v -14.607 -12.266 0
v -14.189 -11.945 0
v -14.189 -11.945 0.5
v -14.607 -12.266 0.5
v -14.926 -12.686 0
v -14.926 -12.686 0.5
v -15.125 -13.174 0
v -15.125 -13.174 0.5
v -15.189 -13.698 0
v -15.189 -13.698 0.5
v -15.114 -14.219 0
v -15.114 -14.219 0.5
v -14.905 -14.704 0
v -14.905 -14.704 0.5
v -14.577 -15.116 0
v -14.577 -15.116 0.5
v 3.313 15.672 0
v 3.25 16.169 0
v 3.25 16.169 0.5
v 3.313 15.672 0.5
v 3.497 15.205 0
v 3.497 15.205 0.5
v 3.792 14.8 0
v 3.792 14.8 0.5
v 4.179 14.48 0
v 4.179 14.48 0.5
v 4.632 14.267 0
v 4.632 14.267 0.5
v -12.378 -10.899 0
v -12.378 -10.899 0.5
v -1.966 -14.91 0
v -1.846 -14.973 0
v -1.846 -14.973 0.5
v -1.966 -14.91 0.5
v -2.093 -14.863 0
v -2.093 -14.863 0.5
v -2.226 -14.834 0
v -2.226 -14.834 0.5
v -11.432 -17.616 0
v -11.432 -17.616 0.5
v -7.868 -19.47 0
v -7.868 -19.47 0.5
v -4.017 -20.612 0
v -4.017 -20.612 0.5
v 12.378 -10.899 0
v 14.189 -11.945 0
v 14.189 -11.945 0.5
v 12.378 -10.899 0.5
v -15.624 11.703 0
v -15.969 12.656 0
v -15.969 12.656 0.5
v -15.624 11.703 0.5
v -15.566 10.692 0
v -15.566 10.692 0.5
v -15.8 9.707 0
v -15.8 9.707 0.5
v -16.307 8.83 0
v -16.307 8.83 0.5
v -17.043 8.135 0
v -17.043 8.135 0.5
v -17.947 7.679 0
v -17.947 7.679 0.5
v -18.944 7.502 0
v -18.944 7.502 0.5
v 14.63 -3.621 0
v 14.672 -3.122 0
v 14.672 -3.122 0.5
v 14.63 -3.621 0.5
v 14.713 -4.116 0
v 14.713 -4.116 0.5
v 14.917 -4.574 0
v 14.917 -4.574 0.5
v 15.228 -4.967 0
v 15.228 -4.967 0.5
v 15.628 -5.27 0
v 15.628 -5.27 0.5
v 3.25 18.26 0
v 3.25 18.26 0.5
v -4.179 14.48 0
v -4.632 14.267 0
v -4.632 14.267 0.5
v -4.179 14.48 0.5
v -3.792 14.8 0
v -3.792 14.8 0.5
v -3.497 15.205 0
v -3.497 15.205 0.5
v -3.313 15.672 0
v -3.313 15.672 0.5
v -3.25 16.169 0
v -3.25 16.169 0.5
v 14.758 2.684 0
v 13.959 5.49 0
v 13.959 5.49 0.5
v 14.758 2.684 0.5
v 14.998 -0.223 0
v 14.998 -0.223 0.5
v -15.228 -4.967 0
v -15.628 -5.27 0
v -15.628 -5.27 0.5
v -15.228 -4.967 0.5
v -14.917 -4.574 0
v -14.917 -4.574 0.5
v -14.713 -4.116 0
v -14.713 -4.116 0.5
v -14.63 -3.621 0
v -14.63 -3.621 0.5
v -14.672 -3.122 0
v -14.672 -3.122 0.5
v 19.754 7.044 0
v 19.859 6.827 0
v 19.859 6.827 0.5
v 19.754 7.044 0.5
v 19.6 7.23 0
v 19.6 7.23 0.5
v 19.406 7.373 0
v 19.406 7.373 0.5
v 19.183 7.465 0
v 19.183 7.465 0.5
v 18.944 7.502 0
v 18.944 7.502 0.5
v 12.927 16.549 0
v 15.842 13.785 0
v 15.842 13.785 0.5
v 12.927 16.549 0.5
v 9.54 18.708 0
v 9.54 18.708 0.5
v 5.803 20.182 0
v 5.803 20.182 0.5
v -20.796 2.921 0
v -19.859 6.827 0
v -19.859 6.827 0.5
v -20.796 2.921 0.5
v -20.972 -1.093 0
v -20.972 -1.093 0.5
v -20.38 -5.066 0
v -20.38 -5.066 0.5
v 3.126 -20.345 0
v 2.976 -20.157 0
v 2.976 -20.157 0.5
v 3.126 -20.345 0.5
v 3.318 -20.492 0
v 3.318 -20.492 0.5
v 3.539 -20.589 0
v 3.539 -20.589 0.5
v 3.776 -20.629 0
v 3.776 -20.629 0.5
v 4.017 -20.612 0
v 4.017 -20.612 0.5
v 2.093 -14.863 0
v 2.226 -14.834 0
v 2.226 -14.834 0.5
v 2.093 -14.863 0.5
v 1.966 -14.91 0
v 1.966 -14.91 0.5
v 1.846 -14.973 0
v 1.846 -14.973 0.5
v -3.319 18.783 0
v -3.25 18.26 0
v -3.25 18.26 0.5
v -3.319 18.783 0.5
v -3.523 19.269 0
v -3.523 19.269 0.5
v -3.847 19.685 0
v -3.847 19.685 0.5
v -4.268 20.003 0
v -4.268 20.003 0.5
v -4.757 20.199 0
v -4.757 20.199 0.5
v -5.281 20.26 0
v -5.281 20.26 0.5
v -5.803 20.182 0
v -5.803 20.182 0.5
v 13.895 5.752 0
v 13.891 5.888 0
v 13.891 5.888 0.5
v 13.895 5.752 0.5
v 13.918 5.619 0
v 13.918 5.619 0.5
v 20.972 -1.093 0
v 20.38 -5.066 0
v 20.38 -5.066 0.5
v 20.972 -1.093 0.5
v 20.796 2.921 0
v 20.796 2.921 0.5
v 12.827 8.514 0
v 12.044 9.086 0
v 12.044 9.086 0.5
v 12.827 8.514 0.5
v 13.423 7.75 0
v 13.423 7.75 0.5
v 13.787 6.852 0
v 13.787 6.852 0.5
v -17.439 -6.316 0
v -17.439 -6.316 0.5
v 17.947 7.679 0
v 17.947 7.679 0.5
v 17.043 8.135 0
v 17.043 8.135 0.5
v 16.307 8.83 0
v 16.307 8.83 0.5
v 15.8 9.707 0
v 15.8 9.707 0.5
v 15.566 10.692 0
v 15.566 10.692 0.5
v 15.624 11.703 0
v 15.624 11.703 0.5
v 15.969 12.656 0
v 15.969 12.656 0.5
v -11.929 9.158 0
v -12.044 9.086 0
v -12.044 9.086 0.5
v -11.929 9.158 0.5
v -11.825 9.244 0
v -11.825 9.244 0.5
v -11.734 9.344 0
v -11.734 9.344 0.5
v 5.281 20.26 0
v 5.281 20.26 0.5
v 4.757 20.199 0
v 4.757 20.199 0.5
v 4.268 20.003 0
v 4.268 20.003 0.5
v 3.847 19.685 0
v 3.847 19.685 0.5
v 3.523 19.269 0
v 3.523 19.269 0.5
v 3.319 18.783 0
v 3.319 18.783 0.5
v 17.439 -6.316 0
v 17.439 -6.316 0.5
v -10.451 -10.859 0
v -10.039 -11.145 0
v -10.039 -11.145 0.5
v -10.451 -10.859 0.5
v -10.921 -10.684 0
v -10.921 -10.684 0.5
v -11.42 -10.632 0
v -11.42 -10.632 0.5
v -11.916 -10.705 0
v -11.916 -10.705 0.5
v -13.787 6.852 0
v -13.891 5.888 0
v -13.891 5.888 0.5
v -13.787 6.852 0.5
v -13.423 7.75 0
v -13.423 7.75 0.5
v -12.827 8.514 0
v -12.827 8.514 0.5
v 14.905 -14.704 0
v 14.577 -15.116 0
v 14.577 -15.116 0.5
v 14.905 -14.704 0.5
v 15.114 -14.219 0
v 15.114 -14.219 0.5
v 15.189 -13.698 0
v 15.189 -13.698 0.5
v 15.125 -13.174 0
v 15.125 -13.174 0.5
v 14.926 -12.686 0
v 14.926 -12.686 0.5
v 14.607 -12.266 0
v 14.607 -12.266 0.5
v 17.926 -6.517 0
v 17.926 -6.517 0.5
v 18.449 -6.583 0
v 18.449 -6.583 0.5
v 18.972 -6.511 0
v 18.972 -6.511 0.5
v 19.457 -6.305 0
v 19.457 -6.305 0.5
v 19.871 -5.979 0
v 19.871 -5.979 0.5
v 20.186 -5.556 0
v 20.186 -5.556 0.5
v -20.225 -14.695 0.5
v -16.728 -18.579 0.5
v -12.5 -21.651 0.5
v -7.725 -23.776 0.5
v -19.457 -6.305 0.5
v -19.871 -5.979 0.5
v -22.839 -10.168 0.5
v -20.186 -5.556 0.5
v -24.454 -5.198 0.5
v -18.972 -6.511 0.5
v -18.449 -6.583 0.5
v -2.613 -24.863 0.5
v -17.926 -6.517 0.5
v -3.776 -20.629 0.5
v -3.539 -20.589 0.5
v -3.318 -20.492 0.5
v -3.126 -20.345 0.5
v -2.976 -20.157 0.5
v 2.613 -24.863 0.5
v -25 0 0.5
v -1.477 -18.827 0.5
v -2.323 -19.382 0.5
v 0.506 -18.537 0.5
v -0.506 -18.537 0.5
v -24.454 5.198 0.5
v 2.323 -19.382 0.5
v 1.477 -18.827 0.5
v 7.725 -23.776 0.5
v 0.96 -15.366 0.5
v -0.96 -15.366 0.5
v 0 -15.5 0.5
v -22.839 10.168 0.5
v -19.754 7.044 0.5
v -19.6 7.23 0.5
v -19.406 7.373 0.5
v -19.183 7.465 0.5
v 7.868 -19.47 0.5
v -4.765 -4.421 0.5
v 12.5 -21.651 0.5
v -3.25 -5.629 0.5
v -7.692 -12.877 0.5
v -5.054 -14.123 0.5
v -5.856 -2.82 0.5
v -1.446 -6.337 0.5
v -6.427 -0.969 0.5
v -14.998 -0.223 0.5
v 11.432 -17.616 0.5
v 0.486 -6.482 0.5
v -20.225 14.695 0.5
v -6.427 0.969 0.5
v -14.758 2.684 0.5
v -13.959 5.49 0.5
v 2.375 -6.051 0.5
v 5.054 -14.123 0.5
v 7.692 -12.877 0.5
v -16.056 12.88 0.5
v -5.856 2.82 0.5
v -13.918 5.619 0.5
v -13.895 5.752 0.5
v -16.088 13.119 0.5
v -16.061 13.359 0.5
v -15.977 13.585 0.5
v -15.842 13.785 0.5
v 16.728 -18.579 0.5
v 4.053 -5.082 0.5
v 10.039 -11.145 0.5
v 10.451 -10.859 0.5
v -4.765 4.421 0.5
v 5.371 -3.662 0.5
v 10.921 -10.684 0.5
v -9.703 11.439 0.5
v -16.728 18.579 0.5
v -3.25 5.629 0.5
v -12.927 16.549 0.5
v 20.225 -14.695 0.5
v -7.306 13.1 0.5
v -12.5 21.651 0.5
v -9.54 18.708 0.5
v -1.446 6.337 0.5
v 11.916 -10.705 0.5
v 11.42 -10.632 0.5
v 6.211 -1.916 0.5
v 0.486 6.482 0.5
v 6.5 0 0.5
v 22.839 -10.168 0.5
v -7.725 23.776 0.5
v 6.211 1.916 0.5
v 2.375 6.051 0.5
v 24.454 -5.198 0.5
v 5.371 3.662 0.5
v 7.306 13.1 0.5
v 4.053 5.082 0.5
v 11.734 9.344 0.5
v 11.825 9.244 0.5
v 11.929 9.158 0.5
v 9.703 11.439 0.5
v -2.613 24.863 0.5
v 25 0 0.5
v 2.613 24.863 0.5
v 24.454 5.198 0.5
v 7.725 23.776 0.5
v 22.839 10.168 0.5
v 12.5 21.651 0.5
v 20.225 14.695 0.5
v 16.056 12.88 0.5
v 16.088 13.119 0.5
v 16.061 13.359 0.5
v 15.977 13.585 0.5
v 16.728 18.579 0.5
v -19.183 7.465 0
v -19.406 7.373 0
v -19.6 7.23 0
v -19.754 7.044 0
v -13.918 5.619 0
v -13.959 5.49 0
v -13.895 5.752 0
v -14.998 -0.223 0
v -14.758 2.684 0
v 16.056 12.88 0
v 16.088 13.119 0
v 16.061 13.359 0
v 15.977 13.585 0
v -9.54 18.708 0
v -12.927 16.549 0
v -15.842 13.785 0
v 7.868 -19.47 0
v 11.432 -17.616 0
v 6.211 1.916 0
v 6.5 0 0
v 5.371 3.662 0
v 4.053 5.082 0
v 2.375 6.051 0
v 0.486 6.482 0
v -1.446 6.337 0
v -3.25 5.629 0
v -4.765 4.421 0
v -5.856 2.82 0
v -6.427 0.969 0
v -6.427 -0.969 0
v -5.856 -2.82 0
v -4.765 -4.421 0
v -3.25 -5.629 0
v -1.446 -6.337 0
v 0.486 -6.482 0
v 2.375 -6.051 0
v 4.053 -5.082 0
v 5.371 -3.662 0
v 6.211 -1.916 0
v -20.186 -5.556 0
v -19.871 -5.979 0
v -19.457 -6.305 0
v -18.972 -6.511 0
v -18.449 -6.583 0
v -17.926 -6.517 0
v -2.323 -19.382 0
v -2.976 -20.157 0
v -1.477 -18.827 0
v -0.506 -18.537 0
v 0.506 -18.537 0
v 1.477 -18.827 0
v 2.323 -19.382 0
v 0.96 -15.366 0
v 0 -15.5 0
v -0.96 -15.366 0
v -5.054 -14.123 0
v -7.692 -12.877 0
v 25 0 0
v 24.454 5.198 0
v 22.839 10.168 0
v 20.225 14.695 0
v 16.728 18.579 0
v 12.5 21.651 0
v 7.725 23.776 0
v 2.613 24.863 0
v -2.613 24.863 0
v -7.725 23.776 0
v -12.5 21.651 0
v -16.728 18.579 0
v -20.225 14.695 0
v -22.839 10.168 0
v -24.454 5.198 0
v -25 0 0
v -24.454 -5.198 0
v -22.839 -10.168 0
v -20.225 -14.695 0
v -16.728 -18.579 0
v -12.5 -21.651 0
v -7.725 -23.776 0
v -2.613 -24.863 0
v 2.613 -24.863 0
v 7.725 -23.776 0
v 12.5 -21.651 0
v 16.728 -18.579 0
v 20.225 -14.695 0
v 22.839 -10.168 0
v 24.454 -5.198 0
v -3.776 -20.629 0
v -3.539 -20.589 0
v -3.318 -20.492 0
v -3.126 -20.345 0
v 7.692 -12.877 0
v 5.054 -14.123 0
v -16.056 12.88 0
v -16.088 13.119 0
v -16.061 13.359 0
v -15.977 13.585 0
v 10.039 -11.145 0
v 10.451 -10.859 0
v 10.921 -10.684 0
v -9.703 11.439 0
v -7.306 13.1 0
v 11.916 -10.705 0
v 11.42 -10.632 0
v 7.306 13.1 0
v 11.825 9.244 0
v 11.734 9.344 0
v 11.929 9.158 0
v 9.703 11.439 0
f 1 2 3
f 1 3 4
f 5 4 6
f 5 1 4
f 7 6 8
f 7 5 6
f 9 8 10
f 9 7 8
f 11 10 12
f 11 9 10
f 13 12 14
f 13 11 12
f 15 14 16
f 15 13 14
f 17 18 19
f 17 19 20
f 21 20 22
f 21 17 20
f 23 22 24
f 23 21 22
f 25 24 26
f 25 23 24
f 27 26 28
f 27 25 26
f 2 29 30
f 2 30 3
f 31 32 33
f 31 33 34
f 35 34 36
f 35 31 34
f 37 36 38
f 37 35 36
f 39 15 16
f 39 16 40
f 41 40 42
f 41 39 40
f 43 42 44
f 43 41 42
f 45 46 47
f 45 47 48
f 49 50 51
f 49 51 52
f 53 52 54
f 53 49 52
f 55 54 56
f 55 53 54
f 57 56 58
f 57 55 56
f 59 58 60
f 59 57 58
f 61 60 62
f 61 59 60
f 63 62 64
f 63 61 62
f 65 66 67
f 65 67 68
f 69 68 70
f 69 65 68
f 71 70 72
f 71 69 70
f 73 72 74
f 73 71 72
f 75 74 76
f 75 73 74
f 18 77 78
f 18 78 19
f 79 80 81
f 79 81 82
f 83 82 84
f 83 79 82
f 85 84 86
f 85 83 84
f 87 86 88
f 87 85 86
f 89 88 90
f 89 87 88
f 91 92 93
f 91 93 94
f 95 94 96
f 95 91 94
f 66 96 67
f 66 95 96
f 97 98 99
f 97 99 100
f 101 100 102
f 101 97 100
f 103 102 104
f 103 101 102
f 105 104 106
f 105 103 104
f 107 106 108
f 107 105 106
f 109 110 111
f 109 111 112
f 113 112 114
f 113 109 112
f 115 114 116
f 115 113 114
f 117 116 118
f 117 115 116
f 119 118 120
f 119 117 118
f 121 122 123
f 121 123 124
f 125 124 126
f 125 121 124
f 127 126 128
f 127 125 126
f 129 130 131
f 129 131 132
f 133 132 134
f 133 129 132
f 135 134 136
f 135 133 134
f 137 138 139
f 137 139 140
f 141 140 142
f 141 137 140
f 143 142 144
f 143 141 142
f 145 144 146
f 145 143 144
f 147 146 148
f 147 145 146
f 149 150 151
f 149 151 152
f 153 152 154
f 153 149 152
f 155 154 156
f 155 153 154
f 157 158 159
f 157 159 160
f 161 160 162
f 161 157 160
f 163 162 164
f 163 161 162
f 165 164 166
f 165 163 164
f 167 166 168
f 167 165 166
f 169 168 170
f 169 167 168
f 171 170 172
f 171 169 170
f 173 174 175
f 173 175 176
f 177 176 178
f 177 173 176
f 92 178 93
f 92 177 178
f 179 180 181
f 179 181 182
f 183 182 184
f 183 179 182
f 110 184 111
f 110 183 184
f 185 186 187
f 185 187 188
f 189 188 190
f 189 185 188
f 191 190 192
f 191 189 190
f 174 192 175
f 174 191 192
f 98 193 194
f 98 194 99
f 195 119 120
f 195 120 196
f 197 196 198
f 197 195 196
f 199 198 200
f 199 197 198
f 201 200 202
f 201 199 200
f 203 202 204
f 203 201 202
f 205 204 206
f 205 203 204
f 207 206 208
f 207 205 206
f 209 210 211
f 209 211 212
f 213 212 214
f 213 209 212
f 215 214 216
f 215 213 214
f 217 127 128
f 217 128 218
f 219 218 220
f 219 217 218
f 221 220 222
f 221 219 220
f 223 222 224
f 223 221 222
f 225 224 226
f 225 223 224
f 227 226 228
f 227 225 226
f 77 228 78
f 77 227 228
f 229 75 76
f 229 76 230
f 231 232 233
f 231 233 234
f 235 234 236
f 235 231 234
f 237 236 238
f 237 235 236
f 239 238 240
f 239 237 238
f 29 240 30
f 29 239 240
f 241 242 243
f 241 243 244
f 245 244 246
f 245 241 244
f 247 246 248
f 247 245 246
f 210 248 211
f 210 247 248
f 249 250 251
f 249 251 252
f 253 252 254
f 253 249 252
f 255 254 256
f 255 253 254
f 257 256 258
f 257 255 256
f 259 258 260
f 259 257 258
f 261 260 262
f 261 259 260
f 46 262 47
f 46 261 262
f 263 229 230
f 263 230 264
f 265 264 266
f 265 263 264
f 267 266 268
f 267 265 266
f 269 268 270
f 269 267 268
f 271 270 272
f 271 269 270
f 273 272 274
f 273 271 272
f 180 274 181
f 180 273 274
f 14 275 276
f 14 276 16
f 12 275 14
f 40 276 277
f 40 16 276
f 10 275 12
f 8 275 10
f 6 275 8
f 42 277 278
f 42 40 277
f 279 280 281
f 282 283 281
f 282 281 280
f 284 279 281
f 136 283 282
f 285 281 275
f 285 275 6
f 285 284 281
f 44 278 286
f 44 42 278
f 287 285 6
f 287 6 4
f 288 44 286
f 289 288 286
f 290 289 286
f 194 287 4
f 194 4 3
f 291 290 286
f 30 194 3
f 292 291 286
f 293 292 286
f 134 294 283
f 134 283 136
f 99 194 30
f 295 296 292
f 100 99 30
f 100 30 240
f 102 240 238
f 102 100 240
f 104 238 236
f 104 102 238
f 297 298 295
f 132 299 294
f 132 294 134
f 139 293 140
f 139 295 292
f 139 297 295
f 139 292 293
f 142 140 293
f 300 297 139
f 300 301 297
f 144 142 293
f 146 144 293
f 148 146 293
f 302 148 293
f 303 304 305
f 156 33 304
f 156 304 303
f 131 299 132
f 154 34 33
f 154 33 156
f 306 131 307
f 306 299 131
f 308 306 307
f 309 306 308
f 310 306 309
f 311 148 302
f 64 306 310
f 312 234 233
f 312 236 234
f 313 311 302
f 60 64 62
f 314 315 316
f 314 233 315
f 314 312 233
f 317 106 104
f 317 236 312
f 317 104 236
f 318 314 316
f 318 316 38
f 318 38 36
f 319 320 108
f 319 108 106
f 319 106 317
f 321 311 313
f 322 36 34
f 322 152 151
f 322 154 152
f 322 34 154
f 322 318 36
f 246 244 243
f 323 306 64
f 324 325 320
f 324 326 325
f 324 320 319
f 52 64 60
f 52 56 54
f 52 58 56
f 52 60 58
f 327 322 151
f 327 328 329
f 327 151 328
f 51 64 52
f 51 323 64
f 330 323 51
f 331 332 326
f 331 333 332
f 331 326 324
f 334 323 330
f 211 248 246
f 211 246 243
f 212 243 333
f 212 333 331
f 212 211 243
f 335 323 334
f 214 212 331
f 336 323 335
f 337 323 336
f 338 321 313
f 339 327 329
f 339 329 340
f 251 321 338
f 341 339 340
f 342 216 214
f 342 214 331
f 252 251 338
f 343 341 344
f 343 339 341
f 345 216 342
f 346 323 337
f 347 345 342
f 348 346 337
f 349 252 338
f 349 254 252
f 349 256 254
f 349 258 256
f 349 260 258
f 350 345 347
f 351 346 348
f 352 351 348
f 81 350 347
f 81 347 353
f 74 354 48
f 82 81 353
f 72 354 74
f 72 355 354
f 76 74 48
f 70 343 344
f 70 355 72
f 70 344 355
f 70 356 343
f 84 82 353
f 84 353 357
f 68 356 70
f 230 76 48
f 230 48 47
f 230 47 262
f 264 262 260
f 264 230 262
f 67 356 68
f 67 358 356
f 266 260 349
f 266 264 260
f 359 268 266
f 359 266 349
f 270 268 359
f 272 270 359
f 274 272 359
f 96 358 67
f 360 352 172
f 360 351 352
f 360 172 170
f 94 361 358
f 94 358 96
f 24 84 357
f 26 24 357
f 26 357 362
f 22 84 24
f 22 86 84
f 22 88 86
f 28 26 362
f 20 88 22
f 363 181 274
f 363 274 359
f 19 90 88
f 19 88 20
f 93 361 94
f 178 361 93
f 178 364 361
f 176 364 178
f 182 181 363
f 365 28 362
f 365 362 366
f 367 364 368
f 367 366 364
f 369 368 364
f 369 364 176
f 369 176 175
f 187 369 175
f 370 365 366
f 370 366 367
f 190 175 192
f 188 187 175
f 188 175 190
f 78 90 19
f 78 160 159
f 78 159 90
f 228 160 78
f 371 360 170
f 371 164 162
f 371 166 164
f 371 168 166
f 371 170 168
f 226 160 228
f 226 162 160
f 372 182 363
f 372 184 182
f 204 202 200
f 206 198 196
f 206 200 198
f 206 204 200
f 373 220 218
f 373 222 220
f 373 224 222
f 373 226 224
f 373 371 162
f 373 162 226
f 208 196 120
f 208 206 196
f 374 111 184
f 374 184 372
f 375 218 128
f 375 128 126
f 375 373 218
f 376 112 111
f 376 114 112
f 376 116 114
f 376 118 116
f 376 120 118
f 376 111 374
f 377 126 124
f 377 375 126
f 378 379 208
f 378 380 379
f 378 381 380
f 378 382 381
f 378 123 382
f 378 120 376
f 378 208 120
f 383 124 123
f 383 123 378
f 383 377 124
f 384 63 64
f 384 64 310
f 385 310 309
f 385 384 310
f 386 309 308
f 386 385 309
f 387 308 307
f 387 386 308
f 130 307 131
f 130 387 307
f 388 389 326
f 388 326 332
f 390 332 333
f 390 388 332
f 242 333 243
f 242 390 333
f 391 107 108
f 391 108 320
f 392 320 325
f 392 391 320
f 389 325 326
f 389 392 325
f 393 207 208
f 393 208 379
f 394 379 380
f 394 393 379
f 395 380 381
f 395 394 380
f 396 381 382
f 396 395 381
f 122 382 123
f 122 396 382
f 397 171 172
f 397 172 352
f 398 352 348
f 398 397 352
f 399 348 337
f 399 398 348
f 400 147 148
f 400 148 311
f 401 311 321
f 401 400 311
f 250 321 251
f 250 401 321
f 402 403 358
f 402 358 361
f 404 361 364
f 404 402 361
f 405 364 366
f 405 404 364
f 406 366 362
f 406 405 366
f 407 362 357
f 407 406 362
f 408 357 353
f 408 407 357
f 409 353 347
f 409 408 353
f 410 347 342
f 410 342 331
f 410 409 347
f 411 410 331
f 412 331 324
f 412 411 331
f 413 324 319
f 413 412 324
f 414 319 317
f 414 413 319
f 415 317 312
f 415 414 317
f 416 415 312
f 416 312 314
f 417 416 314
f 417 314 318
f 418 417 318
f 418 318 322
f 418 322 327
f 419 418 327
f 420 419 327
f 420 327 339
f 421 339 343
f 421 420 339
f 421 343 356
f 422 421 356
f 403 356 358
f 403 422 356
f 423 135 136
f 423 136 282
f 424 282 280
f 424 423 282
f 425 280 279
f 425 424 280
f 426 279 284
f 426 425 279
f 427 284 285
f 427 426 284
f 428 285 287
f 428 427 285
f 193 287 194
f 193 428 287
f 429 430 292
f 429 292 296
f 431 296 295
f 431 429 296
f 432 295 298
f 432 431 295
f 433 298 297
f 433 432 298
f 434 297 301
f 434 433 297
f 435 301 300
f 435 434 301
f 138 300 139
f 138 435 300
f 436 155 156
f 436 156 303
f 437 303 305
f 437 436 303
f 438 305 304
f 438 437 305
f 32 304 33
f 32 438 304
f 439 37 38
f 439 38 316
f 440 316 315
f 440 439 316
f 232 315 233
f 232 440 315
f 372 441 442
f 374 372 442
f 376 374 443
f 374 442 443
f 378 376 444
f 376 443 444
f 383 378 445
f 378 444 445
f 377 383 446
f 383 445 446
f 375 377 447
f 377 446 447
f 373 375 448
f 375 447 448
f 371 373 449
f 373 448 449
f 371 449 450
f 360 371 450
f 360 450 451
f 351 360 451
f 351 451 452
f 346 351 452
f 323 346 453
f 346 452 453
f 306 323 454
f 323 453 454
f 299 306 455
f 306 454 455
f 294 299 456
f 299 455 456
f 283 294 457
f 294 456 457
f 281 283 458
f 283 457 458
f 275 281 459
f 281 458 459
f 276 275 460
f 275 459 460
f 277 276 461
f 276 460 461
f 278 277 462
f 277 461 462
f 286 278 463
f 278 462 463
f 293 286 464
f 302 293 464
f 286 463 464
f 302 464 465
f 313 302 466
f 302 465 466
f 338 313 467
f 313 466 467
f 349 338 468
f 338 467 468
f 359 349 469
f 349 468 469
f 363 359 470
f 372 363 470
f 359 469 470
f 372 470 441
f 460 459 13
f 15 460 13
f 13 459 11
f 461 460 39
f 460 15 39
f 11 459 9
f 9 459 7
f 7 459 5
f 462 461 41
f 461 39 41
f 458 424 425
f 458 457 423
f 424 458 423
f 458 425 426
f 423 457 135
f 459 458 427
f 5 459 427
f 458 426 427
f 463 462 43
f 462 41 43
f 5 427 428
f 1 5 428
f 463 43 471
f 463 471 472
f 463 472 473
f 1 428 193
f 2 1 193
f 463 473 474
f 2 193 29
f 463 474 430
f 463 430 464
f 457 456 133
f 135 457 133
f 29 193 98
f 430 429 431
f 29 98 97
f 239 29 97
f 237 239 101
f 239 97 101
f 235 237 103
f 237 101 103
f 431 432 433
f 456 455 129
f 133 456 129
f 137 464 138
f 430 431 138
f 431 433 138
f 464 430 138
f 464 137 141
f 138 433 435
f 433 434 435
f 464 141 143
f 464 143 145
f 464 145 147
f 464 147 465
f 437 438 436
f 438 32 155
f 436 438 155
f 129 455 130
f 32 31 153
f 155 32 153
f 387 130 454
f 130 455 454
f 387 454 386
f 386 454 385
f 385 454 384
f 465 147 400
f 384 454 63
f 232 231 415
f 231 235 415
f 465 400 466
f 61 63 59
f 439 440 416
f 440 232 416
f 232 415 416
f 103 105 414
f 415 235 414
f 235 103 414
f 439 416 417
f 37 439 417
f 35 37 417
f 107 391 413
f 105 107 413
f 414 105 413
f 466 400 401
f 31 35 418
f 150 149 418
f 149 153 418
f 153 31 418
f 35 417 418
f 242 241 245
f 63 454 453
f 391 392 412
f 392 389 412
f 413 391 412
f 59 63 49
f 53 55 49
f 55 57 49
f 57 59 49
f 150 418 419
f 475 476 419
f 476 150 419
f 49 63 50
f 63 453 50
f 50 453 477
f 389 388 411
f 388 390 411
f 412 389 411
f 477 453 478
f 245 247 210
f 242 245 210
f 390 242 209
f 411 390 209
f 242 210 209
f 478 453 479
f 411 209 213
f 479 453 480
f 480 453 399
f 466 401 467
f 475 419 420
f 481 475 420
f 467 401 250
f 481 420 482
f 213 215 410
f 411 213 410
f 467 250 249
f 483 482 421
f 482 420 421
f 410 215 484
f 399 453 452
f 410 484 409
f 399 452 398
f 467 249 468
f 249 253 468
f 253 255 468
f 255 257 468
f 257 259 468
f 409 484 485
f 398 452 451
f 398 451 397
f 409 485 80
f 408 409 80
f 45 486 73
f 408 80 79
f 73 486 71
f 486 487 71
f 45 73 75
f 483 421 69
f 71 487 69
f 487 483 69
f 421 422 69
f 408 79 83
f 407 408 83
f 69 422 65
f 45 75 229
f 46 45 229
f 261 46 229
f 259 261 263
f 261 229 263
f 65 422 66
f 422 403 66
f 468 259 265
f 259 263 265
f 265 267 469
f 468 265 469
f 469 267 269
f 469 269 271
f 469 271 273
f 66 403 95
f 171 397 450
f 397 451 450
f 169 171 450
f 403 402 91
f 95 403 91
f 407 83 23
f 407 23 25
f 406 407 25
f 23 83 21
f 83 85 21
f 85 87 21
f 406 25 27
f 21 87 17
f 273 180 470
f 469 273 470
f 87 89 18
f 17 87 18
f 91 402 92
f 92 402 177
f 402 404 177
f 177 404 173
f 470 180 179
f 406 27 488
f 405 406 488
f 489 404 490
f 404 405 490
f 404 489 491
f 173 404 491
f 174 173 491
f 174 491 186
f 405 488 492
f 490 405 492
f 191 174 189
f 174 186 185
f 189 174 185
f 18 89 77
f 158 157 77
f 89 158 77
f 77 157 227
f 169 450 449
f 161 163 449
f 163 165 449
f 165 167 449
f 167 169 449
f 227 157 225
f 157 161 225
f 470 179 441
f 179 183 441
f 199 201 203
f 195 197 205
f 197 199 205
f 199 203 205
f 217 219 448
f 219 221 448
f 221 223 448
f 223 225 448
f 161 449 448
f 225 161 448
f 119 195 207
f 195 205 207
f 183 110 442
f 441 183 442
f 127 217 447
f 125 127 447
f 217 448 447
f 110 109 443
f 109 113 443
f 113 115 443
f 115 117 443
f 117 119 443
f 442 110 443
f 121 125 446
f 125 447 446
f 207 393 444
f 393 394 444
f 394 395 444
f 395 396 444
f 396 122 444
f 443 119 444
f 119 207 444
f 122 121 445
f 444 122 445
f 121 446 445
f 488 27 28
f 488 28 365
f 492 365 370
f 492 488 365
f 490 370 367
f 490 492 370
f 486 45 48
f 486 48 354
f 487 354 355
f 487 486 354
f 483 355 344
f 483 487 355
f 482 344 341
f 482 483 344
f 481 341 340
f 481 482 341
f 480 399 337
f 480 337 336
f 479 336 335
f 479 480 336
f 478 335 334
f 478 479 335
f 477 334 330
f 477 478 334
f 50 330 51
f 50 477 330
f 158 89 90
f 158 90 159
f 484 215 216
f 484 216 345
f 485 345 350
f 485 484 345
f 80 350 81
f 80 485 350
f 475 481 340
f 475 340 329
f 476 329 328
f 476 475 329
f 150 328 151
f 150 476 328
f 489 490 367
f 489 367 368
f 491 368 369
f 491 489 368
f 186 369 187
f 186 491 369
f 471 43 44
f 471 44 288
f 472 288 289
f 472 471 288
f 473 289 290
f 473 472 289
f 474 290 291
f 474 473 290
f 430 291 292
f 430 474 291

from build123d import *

# Parameters (mm, degrees)
ESQUISSE1_R          = 25
ESQUISSE1_R_2        = 6.5
BASE_EXTRUSION_DEPTH = 0.5


with BuildPart() as part:
    # Esquisse1 → Base-Extrusion (new body)
    with BuildSketch(Plane.XY):
        Circle(ESQUISSE1_R)
        Circle(ESQUISSE1_R_2, mode=Mode.SUBTRACT)
        with BuildLine():
            Line((15.627789901, -5.269931956), (17.438858637, -6.315552979))
            ThreePointArc((17.438858637, -6.315552979), (19.22097058, -6.424235968), (20.379791125, -5.065976084))
            ThreePointArc((20.379791125, -5.065976084), (20.979912421, 0.918299961), (19.85921918, 6.8272552))
            ThreePointArc((19.85921918, 6.8272552), (19.506948441, 7.307050839), (18.9444347, 7.501670519))
            ThreePointArc((18.9444347, 7.501670519), (16.02146997, 9.25), (15.96885459, 12.655526451))
            ThreePointArc((15.96885459, 12.655526451), (16.081565873, 13.239987481), (15.842186031, 13.784960709))
            ThreePointArc((15.842186031, 13.784960709), (11.285227305, 17.709987145), (5.802631579, 20.18240488))
            ThreePointArc((5.802631579, 20.18240488), (4.046933742, 19.857966791), (3.25, 18.260271082))
            Line((3.25, 18.260271082), (3.25, 16.169029037))
            ThreePointArc((3.25, 16.169029037), (3.632085584, 14.993293973), (4.632352941, 14.266790327))
            ThreePointArc((4.632352941, 14.266790327), (8.545219659, 12.327985276), (11.73385087, 9.344342875))
            ThreePointArc((11.73385087, 9.344342875), (11.875803373, 9.199177654), (12.044151428, 9.085677052))
            ThreePointArc((12.044151428, 9.085677052), (13.423393759, 7.75), (13.890502851, 5.887702578))
            ThreePointArc((13.890502851, 5.887702578), (13.904623229, 5.685158584), (13.959363746, 5.4896415))
            ThreePointArc((13.959363746, 5.4896415), (14.948958256, 1.236384668), (14.671579324, -3.121659837))
            ThreePointArc((14.671579324, -3.121659837), (14.800616259, -4.351168602), (15.627789901, -5.269931956))
        make_face(mode=Mode.SUBTRACT)
        with BuildLine():
            Line((-12.377789901, -10.899097081), (-14.188858637, -11.944718103))
            ThreePointArc((-14.188858637, -11.944718103), (-15.174036838, -13.433730824), (-14.577159546, -15.116428796))
            ThreePointArc((-14.577159546, -15.116428796), (-9.694685116, -18.628287106), (-4.017033149, -20.612215909))
            ThreePointArc((-4.017033149, -20.612215909), (-3.425382567, -20.547038319), (-2.97558011, -20.15719697))
            ThreePointArc((-2.97558011, -20.15719697), (0, -18.5), (2.97558011, -20.15719697))
            ThreePointArc((2.97558011, -20.15719697), (3.425382567, -20.547038319), (4.017033149, -20.612215909))
            ThreePointArc((4.017033149, -20.612215909), (9.694685116, -18.628287106), (14.577159546, -15.116428796))
            ThreePointArc((14.577159546, -15.116428796), (15.174036838, -13.433730824), (14.188858637, -11.944718103))
            Line((14.188858637, -11.944718103), (12.377789901, -10.899097081))
            ThreePointArc((12.377789901, -10.899097081), (11.168530675, -10.642125371), (10.039226383, -11.14513049))
            ThreePointArc((10.039226383, -11.14513049), (6.403738597, -13.564369944), (2.225512876, -14.833984375))
            ThreePointArc((2.225512876, -14.833984375), (2.028819856, -14.884336239), (1.846351423, -14.97337963))
            ThreePointArc((1.846351423, -14.97337963), (0, -15.5), (-1.846351423, -14.97337963))
            ThreePointArc((-1.846351423, -14.97337963), (-2.028819856, -14.884336239), (-2.225512876, -14.833984375))
            ThreePointArc((-2.225512876, -14.833984375), (-6.403738597, -13.564369944), (-10.039226383, -11.14513049))
            ThreePointArc((-10.039226383, -11.14513049), (-11.168530675, -10.642125371), (-12.377789901, -10.899097081))
        make_face(mode=Mode.SUBTRACT)
        with BuildLine():
            Line((-3.25, 16.169029037), (-3.25, 18.260271082))
            ThreePointArc((-3.25, 18.260271082), (-4.046933742, 19.857966791), (-5.802631579, 20.18240488))
            ThreePointArc((-5.802631579, 20.18240488), (-11.285227305, 17.709987145), (-15.842186031, 13.784960709))
            ThreePointArc((-15.842186031, 13.784960709), (-16.081565873, 13.239987481), (-15.96885459, 12.655526451))
            ThreePointArc((-15.96885459, 12.655526451), (-16.02146997, 9.25), (-18.9444347, 7.501670519))
            ThreePointArc((-18.9444347, 7.501670519), (-19.506948441, 7.307050839), (-19.85921918, 6.8272552))
            ThreePointArc((-19.85921918, 6.8272552), (-20.979912421, 0.918299961), (-20.379791125, -5.065976084))
            ThreePointArc((-20.379791125, -5.065976084), (-19.22097058, -6.424235968), (-17.438858637, -6.315552979))
            Line((-17.438858637, -6.315552979), (-15.627789901, -5.269931956))
            ThreePointArc((-15.627789901, -5.269931956), (-14.800616259, -4.351168602), (-14.671579324, -3.121659837))
            ThreePointArc((-14.671579324, -3.121659837), (-14.948958256, 1.236384668), (-13.959363746, 5.4896415))
            ThreePointArc((-13.959363746, 5.4896415), (-13.904623229, 5.685158584), (-13.890502851, 5.887702578))
            ThreePointArc((-13.890502851, 5.887702578), (-13.423393759, 7.75), (-12.044151428, 9.085677052))
            ThreePointArc((-12.044151428, 9.085677052), (-11.875803373, 9.199177654), (-11.73385087, 9.344342875))
            ThreePointArc((-11.73385087, 9.344342875), (-8.545219659, 12.327985276), (-4.632352941, 14.266790327))
            ThreePointArc((-4.632352941, 14.266790327), (-3.632085584, 14.993293973), (-3.25, 16.169029037))
        make_face(mode=Mode.SUBTRACT)
    extrude(amount=BASE_EXTRUSION_DEPTH)


solid = part.part
